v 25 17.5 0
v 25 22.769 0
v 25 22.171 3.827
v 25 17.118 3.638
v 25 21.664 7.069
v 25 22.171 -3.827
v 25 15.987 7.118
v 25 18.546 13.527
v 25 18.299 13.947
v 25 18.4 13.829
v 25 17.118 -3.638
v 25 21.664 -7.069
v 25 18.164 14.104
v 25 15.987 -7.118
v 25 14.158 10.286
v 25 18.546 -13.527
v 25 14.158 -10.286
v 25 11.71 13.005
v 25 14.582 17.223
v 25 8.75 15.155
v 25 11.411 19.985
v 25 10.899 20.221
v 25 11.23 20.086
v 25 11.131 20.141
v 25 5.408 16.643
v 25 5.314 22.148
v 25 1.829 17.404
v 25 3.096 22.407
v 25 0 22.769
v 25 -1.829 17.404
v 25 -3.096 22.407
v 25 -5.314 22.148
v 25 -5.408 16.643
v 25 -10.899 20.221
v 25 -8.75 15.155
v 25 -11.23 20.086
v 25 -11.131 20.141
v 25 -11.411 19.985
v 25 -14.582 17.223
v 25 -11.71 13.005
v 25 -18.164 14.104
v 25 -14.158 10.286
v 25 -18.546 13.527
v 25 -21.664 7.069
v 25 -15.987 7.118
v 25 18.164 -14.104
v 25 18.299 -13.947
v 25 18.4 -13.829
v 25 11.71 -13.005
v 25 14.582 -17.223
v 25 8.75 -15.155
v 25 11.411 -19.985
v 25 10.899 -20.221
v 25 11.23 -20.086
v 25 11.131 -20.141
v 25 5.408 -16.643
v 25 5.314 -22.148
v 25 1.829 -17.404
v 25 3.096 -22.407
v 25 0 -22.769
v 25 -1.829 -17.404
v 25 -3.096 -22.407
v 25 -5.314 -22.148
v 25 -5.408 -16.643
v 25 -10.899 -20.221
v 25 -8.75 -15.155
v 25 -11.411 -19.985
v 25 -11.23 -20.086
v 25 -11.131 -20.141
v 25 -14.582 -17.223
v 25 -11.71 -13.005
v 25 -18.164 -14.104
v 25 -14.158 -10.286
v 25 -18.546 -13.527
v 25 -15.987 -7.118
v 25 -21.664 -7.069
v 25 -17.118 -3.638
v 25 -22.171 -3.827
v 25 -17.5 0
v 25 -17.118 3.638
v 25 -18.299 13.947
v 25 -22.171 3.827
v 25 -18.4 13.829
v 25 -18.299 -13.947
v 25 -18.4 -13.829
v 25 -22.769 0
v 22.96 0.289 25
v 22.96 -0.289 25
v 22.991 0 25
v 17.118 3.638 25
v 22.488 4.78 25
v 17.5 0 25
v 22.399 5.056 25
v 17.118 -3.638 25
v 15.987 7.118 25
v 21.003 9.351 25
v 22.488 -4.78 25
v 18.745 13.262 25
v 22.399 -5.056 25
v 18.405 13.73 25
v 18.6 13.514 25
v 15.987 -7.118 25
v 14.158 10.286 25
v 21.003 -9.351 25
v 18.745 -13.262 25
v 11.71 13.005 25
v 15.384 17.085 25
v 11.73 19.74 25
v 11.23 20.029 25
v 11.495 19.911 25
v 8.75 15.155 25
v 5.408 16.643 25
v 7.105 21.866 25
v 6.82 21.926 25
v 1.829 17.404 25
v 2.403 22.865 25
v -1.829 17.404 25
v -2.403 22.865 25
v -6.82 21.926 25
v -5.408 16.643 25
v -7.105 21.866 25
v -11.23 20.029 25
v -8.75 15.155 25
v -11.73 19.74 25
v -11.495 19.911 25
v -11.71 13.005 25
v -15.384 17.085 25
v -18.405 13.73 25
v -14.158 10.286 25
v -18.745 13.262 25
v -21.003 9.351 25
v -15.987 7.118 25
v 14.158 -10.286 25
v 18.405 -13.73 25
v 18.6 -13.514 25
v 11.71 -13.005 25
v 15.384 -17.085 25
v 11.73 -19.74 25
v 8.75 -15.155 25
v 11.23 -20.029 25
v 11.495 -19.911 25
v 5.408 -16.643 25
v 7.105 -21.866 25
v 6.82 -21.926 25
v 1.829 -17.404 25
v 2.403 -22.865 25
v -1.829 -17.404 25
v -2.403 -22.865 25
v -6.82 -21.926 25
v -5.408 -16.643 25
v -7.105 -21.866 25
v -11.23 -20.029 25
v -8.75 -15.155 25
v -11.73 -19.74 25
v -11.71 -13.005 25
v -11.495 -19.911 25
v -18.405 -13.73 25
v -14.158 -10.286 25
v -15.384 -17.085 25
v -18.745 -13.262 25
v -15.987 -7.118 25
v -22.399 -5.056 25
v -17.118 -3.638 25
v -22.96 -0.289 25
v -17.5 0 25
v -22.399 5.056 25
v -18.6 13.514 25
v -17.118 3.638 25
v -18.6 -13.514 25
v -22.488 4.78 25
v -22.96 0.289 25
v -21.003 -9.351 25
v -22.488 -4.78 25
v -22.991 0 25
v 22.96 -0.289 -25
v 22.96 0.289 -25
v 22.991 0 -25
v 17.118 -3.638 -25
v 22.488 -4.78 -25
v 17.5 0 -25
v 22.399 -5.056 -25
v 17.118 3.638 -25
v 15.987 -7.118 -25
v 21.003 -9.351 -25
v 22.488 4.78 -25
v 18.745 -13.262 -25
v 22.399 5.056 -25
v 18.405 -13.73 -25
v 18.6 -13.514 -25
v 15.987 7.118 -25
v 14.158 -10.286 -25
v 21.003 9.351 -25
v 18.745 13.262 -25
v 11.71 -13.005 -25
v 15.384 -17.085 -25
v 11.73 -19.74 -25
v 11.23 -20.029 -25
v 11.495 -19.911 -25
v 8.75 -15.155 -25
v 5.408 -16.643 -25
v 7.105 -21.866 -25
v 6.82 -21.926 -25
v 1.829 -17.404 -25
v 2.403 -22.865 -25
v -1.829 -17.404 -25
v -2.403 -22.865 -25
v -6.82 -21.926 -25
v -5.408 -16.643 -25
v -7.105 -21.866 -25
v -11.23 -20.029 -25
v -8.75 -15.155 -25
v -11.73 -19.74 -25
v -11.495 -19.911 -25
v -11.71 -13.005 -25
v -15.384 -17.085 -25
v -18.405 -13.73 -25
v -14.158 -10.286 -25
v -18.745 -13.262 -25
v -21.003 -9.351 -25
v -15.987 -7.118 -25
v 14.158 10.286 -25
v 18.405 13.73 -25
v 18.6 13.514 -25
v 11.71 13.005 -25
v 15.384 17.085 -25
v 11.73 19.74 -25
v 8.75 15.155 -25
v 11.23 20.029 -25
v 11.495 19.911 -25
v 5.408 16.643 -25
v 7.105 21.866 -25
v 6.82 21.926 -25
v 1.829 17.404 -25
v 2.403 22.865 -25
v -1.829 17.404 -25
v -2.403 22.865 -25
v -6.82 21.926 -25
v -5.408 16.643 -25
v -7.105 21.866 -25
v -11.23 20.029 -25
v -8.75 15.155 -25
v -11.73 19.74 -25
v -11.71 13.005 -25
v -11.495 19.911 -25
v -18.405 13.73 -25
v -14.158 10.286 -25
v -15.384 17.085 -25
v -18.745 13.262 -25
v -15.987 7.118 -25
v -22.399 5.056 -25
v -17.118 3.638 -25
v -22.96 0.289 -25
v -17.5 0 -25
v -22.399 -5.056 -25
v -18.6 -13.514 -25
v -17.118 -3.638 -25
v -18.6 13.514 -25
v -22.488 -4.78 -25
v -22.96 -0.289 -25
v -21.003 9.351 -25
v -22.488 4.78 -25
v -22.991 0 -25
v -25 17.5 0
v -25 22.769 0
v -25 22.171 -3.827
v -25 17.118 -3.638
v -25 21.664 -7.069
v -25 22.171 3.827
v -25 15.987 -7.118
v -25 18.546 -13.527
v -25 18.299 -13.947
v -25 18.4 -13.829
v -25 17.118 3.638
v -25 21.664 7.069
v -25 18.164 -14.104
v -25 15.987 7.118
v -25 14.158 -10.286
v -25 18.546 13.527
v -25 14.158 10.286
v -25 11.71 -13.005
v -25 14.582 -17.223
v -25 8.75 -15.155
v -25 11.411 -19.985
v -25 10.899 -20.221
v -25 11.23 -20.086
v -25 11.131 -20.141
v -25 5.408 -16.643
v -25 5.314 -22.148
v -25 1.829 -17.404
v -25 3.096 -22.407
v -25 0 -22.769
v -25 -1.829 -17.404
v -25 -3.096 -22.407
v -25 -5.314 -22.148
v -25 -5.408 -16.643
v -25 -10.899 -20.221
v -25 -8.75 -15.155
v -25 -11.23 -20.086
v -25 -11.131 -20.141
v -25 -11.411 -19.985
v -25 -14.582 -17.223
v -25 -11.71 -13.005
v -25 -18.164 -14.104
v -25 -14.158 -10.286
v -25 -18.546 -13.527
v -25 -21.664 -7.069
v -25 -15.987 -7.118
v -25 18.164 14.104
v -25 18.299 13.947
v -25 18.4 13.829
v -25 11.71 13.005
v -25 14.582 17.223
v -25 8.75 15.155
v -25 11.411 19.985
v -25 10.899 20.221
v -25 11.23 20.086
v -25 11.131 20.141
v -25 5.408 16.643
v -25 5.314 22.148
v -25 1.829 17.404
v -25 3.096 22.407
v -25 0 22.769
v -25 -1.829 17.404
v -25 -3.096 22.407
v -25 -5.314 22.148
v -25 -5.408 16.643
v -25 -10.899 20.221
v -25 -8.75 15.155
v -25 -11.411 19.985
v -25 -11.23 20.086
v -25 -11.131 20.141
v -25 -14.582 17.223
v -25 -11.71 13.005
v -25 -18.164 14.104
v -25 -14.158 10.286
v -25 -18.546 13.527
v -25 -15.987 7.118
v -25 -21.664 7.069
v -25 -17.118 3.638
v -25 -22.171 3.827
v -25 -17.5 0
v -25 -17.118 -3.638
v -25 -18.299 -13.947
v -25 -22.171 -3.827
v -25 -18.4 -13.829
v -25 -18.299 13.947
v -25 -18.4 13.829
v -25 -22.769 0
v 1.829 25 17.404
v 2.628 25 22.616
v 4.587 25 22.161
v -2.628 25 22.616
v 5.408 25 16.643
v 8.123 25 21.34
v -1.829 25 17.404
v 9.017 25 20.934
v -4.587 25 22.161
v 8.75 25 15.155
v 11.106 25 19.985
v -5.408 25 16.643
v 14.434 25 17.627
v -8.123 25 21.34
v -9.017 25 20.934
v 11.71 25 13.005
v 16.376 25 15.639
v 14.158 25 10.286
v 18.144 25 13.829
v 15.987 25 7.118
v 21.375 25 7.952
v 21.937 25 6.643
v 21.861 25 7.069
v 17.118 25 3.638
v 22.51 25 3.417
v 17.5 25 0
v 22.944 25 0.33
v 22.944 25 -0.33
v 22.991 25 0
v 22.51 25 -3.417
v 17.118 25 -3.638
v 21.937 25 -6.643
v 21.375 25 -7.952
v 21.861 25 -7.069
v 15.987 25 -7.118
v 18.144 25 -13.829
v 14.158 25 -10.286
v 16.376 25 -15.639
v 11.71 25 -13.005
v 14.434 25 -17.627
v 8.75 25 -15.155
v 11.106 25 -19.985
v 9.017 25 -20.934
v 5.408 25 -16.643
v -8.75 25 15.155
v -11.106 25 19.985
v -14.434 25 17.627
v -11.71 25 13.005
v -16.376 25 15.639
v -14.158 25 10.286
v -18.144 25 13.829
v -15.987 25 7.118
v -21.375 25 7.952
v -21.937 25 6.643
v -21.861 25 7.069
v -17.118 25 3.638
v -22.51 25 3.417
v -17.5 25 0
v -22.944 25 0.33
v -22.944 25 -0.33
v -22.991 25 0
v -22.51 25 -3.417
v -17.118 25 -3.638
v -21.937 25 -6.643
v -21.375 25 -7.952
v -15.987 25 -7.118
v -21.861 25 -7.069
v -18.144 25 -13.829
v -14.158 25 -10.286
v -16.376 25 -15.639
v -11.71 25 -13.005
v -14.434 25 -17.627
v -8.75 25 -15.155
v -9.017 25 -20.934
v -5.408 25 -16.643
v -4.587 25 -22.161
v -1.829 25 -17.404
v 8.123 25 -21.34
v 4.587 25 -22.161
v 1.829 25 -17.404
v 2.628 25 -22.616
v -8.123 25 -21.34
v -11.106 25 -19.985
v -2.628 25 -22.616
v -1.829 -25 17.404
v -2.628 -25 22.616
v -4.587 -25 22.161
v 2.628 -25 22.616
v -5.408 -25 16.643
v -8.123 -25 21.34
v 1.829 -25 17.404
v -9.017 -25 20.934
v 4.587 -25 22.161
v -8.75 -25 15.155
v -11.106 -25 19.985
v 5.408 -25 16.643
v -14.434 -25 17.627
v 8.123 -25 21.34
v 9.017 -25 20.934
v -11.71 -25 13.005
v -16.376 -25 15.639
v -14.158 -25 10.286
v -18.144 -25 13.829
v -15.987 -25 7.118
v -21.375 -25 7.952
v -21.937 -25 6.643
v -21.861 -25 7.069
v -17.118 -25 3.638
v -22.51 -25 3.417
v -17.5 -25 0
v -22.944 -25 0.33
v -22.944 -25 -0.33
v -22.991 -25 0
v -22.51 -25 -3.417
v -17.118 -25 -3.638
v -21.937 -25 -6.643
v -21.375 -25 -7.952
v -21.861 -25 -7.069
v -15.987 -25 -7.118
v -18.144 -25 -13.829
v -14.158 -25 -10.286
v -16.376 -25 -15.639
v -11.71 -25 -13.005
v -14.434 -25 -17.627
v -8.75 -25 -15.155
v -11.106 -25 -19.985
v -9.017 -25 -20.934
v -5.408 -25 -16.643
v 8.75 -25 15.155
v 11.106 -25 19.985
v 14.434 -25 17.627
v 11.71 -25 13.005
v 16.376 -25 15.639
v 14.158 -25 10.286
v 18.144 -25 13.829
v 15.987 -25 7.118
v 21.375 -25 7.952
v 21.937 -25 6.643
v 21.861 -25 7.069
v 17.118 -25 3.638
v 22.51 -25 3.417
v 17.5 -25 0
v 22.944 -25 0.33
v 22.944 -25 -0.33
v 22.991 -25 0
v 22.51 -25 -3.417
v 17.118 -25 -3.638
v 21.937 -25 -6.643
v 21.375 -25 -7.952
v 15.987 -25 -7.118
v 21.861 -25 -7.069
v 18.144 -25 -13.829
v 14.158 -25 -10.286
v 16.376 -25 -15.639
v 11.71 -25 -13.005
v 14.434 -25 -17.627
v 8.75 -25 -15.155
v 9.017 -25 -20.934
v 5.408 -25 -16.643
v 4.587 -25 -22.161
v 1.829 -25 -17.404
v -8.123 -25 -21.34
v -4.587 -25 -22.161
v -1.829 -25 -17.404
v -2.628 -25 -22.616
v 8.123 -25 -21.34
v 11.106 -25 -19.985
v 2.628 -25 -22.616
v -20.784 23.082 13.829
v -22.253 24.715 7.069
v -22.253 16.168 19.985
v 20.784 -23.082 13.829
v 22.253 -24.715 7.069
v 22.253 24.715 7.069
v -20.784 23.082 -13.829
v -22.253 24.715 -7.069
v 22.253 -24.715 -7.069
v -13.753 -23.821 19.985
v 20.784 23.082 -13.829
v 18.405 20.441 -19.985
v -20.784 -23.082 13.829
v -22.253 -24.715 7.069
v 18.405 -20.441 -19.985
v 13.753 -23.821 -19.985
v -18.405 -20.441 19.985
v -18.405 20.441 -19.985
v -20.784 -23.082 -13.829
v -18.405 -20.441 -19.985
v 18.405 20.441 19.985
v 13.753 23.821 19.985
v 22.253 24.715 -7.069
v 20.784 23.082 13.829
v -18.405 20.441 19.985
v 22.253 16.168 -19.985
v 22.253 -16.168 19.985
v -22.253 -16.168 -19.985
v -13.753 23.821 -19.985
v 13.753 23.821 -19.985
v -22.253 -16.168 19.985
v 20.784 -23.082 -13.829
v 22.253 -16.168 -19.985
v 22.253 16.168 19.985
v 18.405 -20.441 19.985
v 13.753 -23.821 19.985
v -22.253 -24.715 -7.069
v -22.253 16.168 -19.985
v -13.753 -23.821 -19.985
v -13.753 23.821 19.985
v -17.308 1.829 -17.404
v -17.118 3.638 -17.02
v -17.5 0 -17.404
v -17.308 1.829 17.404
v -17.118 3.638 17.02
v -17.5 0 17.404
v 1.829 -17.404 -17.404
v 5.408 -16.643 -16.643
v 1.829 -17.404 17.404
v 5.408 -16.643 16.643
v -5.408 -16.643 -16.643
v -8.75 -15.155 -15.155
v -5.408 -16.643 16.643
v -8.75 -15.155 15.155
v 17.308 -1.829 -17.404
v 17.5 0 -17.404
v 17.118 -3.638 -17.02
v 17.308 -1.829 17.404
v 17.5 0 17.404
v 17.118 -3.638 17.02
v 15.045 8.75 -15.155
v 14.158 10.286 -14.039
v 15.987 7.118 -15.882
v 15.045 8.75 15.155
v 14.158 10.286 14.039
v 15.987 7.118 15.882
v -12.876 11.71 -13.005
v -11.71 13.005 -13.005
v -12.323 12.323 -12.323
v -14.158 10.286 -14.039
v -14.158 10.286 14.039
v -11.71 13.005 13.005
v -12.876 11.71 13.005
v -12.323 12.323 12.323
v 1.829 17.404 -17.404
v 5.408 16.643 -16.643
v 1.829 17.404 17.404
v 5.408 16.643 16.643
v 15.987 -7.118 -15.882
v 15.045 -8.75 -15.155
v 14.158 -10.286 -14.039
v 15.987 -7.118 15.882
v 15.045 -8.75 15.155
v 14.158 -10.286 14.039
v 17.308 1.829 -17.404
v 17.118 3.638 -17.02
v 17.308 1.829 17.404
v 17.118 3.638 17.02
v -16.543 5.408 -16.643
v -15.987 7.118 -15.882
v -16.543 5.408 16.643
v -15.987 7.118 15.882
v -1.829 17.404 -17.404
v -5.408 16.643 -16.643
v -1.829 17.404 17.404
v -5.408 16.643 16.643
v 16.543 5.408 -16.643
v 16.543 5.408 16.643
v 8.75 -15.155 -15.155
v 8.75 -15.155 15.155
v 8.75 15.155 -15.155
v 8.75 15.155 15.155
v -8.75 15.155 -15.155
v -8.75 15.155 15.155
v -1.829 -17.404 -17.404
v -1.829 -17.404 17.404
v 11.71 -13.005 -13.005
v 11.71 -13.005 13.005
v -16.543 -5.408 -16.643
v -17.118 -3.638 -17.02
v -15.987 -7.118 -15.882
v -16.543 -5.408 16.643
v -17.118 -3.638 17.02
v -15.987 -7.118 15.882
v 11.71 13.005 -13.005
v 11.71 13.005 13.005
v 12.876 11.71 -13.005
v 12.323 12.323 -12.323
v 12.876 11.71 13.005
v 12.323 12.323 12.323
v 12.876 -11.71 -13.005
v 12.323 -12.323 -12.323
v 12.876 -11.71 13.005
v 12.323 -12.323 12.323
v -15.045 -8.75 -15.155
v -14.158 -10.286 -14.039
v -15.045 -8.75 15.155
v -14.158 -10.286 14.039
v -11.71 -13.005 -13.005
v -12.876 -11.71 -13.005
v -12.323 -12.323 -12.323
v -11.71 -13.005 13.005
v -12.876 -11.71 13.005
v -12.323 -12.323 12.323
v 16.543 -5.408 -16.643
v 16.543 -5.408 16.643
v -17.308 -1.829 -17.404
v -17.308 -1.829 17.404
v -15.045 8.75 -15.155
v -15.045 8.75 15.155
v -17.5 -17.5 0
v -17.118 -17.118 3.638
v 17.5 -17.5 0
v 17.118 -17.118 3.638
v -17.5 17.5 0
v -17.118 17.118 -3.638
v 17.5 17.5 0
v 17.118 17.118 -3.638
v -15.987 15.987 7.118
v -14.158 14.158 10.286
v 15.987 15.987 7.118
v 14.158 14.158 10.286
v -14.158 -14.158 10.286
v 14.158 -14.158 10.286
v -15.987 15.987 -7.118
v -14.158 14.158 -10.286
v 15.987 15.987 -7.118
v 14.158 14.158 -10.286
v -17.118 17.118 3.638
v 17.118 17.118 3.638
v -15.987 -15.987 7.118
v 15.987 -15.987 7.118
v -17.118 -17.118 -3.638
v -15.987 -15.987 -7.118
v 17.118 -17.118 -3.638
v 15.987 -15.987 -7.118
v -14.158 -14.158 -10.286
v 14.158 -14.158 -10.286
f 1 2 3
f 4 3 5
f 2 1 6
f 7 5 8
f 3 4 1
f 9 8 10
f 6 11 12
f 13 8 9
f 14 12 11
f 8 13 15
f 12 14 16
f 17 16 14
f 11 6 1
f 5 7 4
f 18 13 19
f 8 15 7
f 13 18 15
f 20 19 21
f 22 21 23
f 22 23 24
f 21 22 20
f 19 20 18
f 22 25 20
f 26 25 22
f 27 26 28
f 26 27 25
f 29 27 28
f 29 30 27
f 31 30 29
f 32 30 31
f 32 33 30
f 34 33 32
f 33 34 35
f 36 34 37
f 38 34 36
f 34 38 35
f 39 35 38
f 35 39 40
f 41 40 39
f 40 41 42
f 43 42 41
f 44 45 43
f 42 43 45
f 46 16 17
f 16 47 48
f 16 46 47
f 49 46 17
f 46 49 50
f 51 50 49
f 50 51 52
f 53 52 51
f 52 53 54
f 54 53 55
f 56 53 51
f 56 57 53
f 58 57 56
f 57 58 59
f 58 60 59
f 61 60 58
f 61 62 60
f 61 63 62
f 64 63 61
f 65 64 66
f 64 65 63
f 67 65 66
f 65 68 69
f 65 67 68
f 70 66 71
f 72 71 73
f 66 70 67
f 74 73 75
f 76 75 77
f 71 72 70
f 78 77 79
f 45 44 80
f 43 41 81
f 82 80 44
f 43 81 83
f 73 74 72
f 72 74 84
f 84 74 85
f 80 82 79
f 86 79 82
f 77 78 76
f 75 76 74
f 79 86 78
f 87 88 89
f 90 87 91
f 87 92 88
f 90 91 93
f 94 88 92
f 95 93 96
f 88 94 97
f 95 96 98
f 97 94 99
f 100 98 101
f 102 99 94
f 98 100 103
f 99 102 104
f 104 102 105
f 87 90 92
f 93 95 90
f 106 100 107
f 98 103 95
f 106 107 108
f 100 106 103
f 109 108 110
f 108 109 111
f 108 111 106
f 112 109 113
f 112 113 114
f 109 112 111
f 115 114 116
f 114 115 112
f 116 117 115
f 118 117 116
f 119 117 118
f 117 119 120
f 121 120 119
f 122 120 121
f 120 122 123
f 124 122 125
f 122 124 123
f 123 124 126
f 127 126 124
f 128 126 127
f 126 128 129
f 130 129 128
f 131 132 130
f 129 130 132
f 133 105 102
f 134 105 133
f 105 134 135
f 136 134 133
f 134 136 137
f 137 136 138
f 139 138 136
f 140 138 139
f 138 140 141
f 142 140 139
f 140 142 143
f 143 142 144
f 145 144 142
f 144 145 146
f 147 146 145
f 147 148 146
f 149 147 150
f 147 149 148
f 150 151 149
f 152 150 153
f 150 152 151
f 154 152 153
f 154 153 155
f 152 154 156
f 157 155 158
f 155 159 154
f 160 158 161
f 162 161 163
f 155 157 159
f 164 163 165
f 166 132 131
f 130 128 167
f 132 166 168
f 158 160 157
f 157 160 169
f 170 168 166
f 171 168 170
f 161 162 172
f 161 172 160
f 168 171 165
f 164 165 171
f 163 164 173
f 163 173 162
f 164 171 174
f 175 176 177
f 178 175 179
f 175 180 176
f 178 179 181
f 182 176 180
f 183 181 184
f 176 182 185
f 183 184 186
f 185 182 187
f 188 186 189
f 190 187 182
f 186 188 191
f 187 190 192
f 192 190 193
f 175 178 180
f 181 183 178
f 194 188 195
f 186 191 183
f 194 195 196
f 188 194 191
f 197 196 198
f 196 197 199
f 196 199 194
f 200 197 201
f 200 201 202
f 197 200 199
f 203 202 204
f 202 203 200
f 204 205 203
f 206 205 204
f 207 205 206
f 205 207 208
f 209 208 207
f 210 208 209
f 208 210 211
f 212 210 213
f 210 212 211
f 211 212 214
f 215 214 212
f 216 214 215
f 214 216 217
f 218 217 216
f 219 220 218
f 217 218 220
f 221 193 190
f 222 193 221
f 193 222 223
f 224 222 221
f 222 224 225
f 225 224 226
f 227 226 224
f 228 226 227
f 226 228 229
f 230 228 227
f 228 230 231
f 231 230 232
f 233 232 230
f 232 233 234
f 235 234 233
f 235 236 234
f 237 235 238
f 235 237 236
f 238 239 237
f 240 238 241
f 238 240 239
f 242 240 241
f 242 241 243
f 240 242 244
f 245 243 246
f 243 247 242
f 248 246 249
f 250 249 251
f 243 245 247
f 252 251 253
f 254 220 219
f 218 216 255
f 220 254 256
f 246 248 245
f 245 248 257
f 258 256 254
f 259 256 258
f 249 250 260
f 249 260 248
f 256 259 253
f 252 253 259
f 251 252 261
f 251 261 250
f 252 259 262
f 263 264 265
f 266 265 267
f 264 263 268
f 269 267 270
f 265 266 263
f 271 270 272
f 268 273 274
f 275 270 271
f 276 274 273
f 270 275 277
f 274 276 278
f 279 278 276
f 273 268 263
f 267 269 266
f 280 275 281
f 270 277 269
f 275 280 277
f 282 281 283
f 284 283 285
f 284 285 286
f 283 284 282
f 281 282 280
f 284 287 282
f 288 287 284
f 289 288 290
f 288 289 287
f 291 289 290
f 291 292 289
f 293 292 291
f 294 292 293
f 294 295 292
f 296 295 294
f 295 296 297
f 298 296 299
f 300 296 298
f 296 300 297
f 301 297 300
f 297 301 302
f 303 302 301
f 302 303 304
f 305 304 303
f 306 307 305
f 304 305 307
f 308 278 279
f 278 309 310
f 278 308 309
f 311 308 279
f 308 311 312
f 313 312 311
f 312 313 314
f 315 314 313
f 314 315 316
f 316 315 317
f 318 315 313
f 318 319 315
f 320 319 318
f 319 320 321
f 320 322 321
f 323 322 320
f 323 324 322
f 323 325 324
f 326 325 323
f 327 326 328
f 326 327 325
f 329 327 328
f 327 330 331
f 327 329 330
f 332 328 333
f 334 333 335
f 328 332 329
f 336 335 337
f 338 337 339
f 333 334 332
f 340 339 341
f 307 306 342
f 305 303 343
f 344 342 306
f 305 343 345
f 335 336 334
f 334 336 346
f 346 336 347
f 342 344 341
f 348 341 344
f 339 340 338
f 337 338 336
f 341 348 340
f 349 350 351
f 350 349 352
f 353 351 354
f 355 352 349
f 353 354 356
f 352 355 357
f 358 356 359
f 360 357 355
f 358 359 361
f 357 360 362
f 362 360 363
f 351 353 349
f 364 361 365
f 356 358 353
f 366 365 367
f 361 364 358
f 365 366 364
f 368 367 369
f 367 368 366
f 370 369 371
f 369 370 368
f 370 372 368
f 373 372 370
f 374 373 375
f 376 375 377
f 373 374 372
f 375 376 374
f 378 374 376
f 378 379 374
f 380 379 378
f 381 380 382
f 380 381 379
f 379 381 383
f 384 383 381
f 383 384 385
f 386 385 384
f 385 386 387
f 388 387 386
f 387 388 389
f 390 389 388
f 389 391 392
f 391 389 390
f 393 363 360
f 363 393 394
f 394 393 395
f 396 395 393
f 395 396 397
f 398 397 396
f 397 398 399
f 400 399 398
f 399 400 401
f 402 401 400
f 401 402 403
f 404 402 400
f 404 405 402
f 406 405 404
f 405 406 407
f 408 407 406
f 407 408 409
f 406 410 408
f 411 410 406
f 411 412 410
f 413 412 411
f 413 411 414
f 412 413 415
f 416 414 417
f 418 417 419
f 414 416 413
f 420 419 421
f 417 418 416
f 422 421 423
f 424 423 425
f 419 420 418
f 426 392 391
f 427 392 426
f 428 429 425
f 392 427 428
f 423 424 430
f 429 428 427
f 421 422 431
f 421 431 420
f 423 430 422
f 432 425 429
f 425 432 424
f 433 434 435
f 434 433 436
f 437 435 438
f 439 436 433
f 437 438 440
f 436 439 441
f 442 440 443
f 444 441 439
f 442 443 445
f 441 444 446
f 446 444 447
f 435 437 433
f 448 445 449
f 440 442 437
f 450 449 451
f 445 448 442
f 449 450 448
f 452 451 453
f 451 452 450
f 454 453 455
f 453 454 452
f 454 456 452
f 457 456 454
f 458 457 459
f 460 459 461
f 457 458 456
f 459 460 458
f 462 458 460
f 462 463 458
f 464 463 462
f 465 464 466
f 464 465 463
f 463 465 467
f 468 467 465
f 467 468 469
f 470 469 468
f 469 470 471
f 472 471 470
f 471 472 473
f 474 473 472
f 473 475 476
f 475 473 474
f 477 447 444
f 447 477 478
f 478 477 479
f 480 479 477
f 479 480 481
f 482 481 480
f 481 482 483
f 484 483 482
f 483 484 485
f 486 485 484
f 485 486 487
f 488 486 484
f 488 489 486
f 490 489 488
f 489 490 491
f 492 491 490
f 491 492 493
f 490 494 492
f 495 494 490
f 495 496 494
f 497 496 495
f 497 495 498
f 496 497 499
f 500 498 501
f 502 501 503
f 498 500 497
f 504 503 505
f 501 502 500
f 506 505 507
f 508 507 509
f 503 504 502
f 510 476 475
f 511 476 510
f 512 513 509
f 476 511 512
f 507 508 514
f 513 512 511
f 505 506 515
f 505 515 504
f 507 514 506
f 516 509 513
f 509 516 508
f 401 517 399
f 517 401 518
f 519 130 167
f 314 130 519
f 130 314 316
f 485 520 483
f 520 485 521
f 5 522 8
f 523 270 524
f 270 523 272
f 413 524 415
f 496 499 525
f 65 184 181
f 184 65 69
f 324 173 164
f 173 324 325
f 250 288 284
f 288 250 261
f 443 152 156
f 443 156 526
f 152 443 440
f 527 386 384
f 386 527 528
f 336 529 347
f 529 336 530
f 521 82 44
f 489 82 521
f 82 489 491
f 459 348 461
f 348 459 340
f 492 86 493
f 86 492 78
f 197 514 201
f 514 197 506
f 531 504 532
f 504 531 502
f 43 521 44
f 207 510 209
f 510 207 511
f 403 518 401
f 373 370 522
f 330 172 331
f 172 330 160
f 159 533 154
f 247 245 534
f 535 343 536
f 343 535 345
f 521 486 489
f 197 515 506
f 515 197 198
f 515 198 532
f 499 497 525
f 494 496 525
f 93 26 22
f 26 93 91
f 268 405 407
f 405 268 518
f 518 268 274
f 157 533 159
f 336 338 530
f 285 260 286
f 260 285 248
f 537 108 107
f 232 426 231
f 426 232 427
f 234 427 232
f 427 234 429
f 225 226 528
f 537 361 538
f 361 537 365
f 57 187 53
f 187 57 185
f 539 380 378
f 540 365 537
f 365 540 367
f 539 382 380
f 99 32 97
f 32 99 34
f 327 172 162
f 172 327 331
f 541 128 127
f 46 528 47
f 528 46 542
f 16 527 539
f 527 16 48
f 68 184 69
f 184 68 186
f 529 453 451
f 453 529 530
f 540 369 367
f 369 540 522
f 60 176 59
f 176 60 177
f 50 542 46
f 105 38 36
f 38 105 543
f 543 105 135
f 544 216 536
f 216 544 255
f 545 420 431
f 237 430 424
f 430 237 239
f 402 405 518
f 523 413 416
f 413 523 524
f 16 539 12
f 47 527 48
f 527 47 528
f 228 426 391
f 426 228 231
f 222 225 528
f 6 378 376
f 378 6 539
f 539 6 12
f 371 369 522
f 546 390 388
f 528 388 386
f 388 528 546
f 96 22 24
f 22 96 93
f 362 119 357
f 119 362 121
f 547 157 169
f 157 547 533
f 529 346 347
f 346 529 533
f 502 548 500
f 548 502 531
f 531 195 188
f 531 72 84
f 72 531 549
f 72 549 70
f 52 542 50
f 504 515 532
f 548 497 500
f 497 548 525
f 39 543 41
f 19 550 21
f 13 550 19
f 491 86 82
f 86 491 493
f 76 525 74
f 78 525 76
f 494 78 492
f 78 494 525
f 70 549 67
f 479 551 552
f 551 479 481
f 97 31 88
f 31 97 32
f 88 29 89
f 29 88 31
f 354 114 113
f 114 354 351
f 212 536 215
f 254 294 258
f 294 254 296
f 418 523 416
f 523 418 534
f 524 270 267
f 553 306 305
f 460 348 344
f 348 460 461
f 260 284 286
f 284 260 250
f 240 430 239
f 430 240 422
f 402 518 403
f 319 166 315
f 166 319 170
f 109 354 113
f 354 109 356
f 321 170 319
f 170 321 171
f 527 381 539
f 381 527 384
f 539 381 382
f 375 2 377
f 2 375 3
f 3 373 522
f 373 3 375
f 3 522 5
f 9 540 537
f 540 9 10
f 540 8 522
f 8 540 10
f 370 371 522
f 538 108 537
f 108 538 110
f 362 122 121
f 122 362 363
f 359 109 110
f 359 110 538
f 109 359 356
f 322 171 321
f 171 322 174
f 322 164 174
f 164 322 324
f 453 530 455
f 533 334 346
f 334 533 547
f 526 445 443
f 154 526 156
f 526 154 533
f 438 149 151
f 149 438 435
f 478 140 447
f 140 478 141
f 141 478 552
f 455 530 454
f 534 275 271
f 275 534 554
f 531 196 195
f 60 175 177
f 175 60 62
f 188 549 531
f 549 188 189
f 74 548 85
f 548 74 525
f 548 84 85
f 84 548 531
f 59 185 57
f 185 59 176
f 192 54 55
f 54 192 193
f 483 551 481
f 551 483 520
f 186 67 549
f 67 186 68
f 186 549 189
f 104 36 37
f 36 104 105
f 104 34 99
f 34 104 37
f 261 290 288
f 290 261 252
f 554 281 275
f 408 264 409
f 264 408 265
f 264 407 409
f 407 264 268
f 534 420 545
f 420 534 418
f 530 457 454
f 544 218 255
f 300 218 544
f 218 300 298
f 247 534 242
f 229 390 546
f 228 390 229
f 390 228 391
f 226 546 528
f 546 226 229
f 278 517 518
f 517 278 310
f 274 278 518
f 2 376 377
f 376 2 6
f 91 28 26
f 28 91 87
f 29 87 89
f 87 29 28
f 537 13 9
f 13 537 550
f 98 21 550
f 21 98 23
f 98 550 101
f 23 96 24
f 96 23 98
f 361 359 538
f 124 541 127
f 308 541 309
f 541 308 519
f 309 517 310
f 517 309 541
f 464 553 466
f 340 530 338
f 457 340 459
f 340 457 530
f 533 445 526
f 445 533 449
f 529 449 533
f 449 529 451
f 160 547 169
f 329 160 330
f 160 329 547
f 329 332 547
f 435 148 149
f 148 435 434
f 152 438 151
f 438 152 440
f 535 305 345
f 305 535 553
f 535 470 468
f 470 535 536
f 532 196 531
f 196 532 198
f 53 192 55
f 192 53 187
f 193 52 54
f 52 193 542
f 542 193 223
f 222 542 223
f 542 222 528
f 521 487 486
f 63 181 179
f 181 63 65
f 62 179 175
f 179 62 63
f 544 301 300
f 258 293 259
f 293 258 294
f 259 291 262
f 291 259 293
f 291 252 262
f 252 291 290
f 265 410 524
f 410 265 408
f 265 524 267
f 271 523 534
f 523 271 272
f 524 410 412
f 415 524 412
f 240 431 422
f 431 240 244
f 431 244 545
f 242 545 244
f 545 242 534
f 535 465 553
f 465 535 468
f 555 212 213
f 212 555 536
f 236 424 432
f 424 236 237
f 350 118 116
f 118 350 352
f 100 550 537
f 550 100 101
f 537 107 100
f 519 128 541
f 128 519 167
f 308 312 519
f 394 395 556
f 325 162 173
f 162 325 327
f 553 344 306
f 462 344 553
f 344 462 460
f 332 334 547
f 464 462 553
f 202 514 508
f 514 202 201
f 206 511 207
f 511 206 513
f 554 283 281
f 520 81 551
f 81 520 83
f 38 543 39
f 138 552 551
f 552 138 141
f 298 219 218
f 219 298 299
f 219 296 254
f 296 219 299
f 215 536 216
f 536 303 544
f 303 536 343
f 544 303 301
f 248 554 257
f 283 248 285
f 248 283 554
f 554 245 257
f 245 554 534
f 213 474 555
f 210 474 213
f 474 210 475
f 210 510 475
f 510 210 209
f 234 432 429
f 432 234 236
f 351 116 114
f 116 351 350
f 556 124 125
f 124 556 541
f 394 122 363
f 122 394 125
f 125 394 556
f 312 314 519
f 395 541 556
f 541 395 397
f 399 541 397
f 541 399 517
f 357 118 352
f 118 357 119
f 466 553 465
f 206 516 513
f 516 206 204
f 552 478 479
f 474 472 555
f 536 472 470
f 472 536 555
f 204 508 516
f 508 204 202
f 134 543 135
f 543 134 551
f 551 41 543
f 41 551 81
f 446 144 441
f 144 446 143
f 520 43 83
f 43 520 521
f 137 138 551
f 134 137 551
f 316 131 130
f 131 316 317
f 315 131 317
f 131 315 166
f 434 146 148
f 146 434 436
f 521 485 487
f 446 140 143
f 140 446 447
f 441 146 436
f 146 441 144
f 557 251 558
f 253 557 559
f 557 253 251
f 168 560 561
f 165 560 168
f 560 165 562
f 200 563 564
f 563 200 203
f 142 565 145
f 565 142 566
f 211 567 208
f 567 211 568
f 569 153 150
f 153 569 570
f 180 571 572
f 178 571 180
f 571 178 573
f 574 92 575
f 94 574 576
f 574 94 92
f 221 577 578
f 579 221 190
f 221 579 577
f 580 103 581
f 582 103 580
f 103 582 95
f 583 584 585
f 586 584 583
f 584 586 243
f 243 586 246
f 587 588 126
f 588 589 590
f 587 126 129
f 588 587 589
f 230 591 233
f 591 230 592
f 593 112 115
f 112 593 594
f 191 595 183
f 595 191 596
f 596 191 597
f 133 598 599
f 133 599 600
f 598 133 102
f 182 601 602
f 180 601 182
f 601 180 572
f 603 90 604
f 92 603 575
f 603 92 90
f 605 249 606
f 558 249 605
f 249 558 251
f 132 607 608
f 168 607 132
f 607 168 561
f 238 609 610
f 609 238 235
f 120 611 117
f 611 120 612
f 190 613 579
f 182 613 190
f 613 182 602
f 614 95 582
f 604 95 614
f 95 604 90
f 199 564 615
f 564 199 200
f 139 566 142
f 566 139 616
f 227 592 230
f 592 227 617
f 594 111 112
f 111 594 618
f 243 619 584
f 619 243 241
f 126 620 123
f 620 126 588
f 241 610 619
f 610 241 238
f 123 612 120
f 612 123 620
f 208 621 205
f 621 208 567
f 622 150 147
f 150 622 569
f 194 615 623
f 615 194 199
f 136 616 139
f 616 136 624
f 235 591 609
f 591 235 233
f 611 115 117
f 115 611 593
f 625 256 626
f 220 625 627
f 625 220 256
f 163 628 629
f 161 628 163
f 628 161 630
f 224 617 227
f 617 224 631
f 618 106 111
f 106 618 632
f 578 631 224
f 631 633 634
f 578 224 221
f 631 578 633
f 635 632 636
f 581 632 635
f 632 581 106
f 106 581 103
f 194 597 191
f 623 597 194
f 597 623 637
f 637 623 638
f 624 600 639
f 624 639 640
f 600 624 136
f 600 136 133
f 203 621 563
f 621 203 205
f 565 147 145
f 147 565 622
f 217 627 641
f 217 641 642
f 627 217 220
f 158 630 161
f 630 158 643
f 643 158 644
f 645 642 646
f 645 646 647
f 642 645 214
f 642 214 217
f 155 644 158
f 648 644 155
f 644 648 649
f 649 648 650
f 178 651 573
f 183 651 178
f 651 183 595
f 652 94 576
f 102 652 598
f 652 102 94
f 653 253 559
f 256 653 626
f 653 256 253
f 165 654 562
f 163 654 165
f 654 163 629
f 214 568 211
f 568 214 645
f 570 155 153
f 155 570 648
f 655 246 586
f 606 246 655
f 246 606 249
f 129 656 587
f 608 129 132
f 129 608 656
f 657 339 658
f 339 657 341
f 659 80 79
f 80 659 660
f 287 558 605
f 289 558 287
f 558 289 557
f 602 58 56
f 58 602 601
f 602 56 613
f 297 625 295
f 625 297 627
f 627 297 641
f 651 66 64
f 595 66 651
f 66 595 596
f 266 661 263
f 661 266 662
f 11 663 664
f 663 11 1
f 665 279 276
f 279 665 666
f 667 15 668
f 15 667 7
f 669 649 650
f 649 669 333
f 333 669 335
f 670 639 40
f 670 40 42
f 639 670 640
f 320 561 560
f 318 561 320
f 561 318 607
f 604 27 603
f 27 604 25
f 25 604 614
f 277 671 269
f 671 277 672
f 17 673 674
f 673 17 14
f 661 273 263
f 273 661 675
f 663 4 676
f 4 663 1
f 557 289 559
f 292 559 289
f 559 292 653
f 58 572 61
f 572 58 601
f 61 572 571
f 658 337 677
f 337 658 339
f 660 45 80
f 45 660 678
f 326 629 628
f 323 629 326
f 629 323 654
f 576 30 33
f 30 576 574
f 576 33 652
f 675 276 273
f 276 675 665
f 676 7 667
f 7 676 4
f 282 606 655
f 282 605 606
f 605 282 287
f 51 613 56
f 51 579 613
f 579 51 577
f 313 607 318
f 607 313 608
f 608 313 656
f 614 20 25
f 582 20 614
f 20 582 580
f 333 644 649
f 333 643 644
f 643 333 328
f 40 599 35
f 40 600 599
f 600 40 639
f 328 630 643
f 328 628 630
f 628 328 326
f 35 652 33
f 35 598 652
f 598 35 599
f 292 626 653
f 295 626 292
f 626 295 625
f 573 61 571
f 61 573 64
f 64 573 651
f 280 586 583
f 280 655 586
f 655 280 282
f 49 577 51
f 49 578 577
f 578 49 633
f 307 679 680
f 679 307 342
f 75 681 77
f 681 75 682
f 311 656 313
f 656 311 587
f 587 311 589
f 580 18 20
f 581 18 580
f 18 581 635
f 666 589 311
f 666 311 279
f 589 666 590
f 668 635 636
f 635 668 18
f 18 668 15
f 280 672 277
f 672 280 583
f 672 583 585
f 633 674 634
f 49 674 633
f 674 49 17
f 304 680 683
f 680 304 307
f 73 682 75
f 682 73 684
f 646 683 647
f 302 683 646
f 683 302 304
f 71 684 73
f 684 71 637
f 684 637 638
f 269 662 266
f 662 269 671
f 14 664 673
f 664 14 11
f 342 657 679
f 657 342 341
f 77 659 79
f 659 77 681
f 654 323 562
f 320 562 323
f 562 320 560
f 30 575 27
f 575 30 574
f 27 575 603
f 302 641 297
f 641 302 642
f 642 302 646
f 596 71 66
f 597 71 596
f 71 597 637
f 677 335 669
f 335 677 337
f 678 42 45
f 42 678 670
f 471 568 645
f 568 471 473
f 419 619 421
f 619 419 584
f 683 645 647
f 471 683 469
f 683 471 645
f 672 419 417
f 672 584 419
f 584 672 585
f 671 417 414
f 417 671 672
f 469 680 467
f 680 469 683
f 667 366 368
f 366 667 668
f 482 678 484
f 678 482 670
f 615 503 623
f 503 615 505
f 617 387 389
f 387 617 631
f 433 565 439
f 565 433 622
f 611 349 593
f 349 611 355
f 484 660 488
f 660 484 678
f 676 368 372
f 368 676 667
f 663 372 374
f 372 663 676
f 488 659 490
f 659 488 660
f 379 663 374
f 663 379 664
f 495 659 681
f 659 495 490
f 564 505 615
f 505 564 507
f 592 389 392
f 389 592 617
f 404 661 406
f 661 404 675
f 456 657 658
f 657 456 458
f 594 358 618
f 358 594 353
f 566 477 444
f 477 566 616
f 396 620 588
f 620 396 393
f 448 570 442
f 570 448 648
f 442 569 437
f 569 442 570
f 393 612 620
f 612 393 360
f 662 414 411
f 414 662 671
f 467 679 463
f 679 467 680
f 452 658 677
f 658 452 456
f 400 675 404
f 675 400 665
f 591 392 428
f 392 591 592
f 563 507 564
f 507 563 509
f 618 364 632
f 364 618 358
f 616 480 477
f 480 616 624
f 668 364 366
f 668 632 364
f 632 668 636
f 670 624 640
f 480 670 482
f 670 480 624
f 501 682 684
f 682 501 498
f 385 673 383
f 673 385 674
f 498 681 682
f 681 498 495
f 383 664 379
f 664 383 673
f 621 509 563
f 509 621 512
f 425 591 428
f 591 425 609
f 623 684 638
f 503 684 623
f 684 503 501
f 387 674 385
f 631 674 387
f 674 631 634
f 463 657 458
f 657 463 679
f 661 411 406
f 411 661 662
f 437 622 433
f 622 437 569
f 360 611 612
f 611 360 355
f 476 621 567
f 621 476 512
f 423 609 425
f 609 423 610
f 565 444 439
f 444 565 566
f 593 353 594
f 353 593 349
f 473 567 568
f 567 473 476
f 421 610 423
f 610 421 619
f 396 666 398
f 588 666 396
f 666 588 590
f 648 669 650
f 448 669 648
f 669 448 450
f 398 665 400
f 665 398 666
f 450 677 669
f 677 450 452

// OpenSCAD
fudge = 0.005;

difference() {
    
    intersection() {
    color("red")  cube([50, 50, 50],  center = true);
    color("blue") sphere(d = 68);
    }
    
    union(){
        color("green") cylinder(h=50 + fudge, d = 35, center = true);
        rotate([90, 0, 90]) 
            color("green") cylinder(h=50 + fudge, d = 35, center = true);
        rotate([90, 0, 0]) 
            color("green") cylinder(h=50 + fudge, d = 35, center = true);
    }

}
